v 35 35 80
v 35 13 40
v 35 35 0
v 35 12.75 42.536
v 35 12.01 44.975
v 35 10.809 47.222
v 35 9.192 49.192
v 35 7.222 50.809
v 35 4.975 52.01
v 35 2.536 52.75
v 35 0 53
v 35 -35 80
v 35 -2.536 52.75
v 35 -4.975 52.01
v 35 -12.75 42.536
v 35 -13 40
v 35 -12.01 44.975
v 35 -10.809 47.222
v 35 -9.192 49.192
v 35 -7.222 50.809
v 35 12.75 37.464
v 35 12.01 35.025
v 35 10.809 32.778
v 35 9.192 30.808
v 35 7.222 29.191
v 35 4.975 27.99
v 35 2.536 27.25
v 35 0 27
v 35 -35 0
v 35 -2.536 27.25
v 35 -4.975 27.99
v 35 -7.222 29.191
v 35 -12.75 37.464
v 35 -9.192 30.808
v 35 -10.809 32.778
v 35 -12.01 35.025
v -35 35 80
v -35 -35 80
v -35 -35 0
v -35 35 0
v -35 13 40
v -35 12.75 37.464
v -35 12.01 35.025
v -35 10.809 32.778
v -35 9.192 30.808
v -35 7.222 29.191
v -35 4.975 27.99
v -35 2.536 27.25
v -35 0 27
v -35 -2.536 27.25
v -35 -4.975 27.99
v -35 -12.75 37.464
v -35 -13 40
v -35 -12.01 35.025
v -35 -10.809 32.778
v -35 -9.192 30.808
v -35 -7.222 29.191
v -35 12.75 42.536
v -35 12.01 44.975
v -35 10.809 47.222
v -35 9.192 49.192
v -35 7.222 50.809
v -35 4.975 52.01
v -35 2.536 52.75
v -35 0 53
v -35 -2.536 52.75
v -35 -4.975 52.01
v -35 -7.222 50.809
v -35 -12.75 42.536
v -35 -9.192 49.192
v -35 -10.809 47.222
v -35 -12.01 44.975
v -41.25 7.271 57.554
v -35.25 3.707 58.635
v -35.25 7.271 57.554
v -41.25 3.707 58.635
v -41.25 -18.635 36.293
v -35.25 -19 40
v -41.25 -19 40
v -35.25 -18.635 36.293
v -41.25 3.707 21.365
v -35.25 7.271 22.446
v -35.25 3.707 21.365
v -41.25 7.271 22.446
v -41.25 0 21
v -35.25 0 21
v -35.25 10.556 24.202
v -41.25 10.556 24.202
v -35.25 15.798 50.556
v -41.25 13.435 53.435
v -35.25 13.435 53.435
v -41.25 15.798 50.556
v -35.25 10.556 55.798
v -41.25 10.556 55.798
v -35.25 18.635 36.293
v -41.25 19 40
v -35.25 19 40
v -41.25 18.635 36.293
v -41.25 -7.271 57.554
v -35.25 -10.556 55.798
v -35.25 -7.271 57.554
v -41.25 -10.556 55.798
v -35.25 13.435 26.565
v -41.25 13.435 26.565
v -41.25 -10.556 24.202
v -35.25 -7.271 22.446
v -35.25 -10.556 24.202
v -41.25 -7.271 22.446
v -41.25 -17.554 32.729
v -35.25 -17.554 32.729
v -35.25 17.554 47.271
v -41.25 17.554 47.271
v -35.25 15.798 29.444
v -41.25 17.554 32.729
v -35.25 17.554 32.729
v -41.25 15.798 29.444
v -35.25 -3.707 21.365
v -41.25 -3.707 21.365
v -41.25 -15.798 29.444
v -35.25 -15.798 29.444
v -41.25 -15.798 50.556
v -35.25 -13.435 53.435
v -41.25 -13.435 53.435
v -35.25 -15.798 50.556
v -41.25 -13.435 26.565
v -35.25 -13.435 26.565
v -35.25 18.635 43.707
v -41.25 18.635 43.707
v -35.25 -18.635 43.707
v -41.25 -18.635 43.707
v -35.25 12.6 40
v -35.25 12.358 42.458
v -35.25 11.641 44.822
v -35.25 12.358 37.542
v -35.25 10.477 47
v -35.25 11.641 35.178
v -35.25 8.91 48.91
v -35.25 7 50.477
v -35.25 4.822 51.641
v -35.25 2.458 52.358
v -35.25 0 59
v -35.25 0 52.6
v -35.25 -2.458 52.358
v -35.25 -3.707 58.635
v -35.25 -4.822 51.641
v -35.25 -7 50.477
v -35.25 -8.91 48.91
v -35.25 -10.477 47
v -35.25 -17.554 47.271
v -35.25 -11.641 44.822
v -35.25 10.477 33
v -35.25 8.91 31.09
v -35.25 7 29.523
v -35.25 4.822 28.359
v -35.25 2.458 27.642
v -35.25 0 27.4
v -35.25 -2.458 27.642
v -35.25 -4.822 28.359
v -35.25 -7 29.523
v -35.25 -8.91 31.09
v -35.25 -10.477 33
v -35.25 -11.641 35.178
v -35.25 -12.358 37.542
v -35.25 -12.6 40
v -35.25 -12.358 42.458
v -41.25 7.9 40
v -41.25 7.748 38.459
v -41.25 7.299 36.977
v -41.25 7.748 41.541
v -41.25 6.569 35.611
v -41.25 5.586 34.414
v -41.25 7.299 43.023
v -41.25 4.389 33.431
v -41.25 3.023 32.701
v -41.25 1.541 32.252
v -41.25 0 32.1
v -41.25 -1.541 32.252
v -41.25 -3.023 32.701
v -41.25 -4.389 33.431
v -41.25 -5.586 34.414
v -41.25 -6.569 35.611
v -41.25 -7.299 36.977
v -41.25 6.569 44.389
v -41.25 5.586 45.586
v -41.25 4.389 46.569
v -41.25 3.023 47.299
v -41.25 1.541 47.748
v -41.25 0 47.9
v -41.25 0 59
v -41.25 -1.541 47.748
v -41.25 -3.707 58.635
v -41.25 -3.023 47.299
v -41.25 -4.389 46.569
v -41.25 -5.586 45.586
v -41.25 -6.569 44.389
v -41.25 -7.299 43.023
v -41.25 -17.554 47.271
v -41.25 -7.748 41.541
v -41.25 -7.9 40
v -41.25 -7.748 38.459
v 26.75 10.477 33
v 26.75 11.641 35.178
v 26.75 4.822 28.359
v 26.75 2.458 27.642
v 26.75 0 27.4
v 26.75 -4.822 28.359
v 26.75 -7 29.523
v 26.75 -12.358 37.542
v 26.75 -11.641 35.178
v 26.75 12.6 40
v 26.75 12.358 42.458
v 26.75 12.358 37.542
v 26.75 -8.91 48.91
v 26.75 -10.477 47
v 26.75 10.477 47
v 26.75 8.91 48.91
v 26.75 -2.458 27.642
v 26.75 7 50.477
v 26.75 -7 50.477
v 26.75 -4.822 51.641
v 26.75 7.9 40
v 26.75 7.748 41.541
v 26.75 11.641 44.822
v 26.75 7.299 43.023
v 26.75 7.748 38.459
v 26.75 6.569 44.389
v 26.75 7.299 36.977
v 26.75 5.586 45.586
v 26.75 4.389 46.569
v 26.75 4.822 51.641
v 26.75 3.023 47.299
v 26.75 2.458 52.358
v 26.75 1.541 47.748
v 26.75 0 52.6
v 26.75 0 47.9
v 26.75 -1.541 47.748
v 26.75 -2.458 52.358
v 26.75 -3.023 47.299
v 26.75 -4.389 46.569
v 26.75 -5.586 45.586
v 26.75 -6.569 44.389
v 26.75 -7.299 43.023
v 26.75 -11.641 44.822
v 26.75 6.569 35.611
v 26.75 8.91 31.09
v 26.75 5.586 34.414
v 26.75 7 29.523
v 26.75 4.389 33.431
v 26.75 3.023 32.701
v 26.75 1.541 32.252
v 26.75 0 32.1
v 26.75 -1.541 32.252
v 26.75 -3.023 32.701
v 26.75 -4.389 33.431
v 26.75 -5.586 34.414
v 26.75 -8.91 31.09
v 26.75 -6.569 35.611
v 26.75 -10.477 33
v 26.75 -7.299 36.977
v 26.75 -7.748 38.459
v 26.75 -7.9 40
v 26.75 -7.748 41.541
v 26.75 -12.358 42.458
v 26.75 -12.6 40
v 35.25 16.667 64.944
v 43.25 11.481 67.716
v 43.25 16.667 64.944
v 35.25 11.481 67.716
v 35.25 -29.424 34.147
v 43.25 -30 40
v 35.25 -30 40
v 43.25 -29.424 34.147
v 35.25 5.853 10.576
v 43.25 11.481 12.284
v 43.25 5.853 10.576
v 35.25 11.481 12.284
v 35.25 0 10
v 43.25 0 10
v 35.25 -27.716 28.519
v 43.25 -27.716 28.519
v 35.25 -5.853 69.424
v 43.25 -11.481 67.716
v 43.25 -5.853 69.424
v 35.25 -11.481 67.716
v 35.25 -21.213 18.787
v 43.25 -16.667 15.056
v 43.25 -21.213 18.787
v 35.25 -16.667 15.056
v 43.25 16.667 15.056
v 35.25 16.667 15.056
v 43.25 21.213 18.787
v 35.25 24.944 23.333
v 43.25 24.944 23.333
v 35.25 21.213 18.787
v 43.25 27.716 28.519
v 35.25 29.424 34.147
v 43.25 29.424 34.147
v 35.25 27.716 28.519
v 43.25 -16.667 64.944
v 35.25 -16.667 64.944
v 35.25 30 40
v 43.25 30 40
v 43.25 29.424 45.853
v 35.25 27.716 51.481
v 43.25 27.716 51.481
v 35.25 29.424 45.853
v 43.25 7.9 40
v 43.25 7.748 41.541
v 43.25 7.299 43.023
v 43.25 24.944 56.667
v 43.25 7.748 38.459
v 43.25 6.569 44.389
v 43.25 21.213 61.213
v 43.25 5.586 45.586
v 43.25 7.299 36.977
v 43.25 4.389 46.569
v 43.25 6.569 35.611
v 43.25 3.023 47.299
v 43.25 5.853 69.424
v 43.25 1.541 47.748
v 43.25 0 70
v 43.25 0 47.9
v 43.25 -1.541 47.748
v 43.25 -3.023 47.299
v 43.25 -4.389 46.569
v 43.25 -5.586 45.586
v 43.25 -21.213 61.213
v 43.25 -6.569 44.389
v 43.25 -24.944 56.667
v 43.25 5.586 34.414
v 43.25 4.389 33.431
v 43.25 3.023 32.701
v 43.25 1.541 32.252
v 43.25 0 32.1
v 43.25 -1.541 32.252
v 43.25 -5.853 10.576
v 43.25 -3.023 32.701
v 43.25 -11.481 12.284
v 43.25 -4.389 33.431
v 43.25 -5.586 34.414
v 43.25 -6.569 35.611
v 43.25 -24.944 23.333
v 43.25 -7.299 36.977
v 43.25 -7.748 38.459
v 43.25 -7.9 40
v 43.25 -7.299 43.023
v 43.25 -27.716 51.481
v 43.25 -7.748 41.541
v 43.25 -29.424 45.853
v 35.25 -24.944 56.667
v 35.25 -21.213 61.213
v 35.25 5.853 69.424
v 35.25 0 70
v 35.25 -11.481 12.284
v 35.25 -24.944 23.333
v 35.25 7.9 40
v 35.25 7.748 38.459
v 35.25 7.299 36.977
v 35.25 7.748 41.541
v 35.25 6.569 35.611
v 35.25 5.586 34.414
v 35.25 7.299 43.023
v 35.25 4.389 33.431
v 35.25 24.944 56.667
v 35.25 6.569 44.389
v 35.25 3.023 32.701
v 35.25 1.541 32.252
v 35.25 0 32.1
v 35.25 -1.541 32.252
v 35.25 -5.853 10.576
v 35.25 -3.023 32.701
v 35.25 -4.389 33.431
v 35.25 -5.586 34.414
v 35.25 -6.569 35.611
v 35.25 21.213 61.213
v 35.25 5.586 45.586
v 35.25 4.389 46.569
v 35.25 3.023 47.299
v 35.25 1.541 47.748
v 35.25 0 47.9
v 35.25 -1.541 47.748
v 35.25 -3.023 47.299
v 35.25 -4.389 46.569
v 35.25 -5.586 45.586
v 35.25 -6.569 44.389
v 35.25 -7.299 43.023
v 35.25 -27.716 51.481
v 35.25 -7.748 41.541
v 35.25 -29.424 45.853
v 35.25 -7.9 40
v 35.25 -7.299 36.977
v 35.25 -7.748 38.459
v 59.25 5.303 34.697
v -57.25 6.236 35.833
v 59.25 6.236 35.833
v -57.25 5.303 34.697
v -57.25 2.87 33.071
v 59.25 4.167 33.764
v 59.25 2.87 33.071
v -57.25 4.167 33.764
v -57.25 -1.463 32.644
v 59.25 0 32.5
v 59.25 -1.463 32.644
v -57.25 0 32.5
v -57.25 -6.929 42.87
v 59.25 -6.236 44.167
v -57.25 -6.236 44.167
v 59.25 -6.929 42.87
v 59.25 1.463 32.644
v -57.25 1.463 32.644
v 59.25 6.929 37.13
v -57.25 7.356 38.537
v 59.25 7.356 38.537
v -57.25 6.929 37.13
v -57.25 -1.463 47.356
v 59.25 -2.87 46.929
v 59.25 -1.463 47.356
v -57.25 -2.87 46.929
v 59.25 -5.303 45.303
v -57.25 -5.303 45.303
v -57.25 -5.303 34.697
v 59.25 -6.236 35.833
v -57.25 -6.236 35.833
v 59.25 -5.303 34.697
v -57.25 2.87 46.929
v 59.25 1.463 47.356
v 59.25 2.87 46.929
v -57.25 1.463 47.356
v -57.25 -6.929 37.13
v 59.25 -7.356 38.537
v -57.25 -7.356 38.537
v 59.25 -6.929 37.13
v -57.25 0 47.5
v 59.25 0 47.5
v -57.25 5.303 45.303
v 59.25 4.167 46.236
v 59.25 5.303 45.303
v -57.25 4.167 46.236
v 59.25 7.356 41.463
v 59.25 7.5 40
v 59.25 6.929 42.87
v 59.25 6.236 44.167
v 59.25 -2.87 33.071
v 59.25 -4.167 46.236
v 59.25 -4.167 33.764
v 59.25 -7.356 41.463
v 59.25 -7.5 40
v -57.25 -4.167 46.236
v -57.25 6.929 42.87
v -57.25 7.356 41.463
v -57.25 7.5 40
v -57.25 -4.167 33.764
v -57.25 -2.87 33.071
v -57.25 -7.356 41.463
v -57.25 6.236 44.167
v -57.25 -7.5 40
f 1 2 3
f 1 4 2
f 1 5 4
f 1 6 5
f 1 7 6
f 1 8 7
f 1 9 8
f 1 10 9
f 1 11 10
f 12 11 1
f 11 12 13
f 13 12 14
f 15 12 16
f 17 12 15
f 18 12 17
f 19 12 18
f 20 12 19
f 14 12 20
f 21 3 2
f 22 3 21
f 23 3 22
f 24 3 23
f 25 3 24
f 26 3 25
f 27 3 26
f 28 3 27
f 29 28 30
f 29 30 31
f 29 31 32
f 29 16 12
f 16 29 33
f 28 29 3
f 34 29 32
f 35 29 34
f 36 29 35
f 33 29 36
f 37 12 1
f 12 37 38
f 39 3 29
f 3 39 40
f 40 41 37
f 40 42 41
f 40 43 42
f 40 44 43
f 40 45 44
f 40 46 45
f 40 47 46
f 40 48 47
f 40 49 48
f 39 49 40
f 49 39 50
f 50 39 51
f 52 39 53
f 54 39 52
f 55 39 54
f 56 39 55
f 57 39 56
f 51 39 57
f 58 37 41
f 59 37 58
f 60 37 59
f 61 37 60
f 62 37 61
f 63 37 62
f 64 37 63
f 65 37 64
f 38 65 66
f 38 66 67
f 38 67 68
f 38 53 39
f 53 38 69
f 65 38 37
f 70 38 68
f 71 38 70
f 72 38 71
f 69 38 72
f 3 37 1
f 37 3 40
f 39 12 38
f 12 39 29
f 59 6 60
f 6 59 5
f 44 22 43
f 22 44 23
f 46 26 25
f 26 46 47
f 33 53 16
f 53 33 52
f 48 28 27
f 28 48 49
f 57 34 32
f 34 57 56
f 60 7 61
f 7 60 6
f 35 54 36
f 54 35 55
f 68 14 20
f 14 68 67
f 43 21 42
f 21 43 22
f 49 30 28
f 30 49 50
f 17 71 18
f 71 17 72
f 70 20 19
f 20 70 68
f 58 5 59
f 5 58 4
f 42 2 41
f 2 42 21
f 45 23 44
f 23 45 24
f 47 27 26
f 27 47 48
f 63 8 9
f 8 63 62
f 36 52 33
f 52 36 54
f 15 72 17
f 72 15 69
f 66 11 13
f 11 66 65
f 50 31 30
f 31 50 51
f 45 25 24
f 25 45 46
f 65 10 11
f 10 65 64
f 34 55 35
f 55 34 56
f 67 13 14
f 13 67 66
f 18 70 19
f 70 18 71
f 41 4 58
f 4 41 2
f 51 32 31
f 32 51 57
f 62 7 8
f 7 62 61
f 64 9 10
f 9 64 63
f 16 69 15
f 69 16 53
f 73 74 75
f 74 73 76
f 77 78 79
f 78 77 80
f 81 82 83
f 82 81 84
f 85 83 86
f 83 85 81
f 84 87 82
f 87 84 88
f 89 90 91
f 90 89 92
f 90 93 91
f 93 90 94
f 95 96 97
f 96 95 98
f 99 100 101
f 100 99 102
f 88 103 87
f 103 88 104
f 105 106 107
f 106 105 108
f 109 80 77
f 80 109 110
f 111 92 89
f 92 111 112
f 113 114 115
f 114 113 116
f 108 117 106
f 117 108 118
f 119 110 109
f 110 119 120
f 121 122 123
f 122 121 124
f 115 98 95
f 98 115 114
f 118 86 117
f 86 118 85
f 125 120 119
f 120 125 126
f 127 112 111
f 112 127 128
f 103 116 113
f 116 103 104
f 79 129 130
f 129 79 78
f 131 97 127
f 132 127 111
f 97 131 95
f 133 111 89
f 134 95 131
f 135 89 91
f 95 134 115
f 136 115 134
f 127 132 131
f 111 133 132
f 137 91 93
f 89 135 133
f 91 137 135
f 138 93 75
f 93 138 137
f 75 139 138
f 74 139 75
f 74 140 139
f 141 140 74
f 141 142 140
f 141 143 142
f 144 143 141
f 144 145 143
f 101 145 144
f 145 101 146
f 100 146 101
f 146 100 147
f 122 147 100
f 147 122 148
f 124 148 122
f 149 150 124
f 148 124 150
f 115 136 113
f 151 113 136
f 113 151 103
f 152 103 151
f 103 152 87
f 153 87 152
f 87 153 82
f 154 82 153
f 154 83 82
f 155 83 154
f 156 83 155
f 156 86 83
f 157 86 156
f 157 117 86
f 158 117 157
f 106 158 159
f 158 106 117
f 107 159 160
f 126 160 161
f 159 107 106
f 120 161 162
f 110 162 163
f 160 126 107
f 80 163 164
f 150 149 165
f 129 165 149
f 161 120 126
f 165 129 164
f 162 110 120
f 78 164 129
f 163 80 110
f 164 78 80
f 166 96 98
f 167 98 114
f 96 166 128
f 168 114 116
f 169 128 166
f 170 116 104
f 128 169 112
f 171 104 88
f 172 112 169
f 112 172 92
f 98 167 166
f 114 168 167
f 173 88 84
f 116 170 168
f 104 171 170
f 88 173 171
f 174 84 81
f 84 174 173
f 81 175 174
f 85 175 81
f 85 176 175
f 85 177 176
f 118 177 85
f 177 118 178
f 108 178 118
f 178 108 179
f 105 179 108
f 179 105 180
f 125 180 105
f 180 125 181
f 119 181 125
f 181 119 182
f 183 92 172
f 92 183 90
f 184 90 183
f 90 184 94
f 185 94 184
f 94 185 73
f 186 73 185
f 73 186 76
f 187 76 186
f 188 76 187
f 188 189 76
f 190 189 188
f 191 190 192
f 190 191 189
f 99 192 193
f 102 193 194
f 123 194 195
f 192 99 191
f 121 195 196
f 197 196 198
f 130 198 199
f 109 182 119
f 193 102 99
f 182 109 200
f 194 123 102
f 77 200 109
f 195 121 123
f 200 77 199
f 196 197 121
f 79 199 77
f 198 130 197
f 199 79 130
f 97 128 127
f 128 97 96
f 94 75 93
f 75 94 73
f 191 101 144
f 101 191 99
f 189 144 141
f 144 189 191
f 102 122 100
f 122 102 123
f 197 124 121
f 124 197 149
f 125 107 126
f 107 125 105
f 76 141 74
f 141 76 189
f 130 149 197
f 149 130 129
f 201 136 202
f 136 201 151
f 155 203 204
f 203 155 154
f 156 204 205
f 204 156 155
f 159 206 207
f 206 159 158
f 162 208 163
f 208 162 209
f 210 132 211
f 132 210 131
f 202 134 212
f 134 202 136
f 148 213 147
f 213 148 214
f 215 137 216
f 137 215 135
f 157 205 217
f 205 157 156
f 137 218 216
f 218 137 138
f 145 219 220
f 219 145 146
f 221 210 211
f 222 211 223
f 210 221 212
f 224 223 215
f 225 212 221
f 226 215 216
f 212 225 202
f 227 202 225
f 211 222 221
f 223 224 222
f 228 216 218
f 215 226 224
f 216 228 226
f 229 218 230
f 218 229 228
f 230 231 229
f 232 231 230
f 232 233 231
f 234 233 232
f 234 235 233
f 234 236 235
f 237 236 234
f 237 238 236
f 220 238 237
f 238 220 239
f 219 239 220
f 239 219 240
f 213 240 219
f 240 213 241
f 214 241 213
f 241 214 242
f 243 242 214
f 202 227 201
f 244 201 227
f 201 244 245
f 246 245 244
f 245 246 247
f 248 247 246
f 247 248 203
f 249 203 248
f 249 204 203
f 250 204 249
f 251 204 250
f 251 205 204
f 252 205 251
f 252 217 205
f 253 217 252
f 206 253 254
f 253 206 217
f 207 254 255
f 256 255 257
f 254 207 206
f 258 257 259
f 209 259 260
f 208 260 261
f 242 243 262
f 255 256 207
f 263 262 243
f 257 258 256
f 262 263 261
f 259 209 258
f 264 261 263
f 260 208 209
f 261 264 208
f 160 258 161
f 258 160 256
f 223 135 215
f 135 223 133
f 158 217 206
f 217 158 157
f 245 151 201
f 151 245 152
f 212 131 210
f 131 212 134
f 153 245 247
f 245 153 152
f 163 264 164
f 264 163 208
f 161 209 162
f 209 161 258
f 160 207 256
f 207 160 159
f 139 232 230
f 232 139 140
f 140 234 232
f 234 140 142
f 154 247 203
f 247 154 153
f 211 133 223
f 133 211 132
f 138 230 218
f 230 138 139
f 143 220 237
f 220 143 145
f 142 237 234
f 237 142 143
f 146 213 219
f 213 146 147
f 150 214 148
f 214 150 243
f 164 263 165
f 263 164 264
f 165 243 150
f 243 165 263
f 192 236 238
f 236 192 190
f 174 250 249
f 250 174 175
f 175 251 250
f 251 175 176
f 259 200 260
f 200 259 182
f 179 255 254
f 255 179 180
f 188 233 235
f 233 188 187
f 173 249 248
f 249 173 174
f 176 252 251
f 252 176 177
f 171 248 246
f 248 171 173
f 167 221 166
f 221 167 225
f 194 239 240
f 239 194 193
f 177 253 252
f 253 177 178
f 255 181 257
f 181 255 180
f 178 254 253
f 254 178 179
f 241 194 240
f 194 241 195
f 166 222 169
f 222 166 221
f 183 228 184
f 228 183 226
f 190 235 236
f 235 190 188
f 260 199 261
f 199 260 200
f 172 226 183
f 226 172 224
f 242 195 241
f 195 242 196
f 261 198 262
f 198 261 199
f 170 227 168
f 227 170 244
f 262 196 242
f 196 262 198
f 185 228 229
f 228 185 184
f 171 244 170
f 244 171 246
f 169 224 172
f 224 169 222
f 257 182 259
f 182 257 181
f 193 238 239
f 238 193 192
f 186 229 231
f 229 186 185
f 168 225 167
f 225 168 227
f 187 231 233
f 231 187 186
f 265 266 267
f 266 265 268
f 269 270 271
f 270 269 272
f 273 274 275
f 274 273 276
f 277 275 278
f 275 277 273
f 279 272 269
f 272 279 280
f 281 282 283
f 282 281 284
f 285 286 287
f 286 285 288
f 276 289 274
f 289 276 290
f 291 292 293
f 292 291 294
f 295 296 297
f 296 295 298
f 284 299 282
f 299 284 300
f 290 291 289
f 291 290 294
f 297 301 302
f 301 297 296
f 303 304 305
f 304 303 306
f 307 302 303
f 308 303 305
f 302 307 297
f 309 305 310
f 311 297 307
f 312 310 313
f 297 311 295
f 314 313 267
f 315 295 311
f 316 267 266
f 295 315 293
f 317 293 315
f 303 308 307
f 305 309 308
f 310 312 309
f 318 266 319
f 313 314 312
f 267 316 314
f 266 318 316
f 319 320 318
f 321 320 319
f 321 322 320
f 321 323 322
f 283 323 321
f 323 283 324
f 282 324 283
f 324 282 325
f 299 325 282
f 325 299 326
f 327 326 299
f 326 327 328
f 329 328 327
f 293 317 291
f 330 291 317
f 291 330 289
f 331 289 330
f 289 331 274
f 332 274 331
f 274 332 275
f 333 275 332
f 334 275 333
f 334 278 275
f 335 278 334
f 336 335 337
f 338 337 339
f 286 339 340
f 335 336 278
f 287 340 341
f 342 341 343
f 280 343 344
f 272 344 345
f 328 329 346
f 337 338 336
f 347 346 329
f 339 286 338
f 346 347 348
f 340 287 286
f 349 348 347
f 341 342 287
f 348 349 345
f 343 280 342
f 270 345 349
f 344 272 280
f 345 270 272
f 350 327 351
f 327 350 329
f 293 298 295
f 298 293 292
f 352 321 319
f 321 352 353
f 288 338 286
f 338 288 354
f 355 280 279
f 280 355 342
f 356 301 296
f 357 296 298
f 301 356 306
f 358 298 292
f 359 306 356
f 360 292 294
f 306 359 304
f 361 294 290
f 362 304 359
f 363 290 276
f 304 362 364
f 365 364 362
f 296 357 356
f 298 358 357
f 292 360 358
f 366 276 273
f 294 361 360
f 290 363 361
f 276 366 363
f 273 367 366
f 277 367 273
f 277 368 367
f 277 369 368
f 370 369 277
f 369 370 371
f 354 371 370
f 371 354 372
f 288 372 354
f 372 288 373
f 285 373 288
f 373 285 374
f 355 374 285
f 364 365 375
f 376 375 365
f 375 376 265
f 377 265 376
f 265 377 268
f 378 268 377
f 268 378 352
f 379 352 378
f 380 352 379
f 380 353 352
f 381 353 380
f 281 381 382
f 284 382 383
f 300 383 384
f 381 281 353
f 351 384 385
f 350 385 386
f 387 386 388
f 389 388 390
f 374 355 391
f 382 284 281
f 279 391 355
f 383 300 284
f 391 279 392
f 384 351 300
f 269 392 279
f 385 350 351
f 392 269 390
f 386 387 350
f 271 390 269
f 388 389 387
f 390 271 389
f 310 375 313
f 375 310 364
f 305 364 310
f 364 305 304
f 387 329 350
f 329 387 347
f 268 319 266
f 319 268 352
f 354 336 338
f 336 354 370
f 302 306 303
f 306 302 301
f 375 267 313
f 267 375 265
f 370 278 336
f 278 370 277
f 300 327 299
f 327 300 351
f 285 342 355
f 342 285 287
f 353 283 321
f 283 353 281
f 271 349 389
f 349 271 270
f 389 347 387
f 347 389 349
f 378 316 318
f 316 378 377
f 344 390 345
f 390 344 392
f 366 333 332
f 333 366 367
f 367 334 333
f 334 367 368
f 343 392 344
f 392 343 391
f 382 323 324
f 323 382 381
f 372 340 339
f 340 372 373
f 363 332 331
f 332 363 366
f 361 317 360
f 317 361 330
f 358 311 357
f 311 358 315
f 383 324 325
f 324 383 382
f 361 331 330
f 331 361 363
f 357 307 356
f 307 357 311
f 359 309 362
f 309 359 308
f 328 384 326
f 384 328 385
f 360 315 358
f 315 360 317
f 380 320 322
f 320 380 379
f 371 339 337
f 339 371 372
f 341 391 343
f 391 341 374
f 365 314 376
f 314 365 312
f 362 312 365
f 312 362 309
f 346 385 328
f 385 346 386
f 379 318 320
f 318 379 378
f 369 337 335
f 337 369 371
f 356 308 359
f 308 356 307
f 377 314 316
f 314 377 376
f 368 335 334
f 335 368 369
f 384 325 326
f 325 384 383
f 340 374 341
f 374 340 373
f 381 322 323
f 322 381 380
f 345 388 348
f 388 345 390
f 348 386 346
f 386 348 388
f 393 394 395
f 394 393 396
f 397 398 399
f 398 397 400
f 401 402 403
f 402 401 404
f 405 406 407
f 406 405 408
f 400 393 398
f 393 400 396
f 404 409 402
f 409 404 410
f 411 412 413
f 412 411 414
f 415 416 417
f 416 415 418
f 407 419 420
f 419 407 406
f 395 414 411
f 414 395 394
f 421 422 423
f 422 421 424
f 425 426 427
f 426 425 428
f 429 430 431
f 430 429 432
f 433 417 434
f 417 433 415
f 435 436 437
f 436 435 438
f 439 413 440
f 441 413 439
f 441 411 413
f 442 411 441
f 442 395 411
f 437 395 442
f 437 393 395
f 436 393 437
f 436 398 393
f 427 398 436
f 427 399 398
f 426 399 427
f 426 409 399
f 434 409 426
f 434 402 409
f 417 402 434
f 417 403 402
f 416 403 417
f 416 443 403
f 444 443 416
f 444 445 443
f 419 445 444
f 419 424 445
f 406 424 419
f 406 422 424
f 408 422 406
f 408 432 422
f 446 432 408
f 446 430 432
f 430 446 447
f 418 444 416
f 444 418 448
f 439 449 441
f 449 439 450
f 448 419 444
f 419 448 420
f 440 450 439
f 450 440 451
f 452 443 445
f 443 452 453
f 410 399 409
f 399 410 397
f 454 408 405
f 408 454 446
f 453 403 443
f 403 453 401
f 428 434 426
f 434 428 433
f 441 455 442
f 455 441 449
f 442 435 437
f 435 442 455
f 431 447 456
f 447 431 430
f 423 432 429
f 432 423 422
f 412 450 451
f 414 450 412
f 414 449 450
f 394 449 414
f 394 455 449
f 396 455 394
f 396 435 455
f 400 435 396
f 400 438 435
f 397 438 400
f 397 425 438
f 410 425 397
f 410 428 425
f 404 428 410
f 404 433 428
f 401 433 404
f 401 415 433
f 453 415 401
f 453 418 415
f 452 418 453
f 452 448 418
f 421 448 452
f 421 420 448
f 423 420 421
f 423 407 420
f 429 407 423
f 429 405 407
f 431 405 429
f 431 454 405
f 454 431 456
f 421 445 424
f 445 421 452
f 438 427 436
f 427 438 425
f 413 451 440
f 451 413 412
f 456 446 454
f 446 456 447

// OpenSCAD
$fn = 32;

// ------------------------------------------------------------------------
// Bushed housing: 70 x 70 x 80 mm housing, bushing d25.2
// Every part is its own module, assembly() places them once.
// ------------------------------------------------------------------------

// --- part 1 ---
module housing() {
  difference() {
    translate([-35, -35, 0]) cube([70, 70, 80]);
    translate([0, 0, 40]) rotate([0, 90, 0]) cylinder(h = 72, d = 26, center = true);
  }
}

// --- part 2 ---
module bushing() {
  difference() {
    union() {
      cylinder(h = 6, d = 38);
      translate([0, 0, 6]) cylinder(h = 62, d = 25.2);
    }
    translate([0, 0, -1]) cylinder(h = 70, d = 15.8);
  }
}

// --- part 3 ---
module shaft() {
  translate([0, 0, -58.25]) cylinder(h = 116.5, d = 15);
}

// --- part 4 ---
module cover() {
  difference() {
    cylinder(h = 8, d = 60);
    translate([0, 0, -1]) cylinder(h = 10, d = 15.8);
  }
}

// --- assembly ---
module assembly() {
  translate([0, 0, 0]) rotate([0, 0, 0]) housing();
  translate([-41.25, 0, 40]) rotate([0, 90, 0]) bushing();
  translate([1, 0, 40]) rotate([0, 90, 0]) shaft();
  translate([35.25, 0, 40]) rotate([0, 90, 0]) cover();
}

assembly();
